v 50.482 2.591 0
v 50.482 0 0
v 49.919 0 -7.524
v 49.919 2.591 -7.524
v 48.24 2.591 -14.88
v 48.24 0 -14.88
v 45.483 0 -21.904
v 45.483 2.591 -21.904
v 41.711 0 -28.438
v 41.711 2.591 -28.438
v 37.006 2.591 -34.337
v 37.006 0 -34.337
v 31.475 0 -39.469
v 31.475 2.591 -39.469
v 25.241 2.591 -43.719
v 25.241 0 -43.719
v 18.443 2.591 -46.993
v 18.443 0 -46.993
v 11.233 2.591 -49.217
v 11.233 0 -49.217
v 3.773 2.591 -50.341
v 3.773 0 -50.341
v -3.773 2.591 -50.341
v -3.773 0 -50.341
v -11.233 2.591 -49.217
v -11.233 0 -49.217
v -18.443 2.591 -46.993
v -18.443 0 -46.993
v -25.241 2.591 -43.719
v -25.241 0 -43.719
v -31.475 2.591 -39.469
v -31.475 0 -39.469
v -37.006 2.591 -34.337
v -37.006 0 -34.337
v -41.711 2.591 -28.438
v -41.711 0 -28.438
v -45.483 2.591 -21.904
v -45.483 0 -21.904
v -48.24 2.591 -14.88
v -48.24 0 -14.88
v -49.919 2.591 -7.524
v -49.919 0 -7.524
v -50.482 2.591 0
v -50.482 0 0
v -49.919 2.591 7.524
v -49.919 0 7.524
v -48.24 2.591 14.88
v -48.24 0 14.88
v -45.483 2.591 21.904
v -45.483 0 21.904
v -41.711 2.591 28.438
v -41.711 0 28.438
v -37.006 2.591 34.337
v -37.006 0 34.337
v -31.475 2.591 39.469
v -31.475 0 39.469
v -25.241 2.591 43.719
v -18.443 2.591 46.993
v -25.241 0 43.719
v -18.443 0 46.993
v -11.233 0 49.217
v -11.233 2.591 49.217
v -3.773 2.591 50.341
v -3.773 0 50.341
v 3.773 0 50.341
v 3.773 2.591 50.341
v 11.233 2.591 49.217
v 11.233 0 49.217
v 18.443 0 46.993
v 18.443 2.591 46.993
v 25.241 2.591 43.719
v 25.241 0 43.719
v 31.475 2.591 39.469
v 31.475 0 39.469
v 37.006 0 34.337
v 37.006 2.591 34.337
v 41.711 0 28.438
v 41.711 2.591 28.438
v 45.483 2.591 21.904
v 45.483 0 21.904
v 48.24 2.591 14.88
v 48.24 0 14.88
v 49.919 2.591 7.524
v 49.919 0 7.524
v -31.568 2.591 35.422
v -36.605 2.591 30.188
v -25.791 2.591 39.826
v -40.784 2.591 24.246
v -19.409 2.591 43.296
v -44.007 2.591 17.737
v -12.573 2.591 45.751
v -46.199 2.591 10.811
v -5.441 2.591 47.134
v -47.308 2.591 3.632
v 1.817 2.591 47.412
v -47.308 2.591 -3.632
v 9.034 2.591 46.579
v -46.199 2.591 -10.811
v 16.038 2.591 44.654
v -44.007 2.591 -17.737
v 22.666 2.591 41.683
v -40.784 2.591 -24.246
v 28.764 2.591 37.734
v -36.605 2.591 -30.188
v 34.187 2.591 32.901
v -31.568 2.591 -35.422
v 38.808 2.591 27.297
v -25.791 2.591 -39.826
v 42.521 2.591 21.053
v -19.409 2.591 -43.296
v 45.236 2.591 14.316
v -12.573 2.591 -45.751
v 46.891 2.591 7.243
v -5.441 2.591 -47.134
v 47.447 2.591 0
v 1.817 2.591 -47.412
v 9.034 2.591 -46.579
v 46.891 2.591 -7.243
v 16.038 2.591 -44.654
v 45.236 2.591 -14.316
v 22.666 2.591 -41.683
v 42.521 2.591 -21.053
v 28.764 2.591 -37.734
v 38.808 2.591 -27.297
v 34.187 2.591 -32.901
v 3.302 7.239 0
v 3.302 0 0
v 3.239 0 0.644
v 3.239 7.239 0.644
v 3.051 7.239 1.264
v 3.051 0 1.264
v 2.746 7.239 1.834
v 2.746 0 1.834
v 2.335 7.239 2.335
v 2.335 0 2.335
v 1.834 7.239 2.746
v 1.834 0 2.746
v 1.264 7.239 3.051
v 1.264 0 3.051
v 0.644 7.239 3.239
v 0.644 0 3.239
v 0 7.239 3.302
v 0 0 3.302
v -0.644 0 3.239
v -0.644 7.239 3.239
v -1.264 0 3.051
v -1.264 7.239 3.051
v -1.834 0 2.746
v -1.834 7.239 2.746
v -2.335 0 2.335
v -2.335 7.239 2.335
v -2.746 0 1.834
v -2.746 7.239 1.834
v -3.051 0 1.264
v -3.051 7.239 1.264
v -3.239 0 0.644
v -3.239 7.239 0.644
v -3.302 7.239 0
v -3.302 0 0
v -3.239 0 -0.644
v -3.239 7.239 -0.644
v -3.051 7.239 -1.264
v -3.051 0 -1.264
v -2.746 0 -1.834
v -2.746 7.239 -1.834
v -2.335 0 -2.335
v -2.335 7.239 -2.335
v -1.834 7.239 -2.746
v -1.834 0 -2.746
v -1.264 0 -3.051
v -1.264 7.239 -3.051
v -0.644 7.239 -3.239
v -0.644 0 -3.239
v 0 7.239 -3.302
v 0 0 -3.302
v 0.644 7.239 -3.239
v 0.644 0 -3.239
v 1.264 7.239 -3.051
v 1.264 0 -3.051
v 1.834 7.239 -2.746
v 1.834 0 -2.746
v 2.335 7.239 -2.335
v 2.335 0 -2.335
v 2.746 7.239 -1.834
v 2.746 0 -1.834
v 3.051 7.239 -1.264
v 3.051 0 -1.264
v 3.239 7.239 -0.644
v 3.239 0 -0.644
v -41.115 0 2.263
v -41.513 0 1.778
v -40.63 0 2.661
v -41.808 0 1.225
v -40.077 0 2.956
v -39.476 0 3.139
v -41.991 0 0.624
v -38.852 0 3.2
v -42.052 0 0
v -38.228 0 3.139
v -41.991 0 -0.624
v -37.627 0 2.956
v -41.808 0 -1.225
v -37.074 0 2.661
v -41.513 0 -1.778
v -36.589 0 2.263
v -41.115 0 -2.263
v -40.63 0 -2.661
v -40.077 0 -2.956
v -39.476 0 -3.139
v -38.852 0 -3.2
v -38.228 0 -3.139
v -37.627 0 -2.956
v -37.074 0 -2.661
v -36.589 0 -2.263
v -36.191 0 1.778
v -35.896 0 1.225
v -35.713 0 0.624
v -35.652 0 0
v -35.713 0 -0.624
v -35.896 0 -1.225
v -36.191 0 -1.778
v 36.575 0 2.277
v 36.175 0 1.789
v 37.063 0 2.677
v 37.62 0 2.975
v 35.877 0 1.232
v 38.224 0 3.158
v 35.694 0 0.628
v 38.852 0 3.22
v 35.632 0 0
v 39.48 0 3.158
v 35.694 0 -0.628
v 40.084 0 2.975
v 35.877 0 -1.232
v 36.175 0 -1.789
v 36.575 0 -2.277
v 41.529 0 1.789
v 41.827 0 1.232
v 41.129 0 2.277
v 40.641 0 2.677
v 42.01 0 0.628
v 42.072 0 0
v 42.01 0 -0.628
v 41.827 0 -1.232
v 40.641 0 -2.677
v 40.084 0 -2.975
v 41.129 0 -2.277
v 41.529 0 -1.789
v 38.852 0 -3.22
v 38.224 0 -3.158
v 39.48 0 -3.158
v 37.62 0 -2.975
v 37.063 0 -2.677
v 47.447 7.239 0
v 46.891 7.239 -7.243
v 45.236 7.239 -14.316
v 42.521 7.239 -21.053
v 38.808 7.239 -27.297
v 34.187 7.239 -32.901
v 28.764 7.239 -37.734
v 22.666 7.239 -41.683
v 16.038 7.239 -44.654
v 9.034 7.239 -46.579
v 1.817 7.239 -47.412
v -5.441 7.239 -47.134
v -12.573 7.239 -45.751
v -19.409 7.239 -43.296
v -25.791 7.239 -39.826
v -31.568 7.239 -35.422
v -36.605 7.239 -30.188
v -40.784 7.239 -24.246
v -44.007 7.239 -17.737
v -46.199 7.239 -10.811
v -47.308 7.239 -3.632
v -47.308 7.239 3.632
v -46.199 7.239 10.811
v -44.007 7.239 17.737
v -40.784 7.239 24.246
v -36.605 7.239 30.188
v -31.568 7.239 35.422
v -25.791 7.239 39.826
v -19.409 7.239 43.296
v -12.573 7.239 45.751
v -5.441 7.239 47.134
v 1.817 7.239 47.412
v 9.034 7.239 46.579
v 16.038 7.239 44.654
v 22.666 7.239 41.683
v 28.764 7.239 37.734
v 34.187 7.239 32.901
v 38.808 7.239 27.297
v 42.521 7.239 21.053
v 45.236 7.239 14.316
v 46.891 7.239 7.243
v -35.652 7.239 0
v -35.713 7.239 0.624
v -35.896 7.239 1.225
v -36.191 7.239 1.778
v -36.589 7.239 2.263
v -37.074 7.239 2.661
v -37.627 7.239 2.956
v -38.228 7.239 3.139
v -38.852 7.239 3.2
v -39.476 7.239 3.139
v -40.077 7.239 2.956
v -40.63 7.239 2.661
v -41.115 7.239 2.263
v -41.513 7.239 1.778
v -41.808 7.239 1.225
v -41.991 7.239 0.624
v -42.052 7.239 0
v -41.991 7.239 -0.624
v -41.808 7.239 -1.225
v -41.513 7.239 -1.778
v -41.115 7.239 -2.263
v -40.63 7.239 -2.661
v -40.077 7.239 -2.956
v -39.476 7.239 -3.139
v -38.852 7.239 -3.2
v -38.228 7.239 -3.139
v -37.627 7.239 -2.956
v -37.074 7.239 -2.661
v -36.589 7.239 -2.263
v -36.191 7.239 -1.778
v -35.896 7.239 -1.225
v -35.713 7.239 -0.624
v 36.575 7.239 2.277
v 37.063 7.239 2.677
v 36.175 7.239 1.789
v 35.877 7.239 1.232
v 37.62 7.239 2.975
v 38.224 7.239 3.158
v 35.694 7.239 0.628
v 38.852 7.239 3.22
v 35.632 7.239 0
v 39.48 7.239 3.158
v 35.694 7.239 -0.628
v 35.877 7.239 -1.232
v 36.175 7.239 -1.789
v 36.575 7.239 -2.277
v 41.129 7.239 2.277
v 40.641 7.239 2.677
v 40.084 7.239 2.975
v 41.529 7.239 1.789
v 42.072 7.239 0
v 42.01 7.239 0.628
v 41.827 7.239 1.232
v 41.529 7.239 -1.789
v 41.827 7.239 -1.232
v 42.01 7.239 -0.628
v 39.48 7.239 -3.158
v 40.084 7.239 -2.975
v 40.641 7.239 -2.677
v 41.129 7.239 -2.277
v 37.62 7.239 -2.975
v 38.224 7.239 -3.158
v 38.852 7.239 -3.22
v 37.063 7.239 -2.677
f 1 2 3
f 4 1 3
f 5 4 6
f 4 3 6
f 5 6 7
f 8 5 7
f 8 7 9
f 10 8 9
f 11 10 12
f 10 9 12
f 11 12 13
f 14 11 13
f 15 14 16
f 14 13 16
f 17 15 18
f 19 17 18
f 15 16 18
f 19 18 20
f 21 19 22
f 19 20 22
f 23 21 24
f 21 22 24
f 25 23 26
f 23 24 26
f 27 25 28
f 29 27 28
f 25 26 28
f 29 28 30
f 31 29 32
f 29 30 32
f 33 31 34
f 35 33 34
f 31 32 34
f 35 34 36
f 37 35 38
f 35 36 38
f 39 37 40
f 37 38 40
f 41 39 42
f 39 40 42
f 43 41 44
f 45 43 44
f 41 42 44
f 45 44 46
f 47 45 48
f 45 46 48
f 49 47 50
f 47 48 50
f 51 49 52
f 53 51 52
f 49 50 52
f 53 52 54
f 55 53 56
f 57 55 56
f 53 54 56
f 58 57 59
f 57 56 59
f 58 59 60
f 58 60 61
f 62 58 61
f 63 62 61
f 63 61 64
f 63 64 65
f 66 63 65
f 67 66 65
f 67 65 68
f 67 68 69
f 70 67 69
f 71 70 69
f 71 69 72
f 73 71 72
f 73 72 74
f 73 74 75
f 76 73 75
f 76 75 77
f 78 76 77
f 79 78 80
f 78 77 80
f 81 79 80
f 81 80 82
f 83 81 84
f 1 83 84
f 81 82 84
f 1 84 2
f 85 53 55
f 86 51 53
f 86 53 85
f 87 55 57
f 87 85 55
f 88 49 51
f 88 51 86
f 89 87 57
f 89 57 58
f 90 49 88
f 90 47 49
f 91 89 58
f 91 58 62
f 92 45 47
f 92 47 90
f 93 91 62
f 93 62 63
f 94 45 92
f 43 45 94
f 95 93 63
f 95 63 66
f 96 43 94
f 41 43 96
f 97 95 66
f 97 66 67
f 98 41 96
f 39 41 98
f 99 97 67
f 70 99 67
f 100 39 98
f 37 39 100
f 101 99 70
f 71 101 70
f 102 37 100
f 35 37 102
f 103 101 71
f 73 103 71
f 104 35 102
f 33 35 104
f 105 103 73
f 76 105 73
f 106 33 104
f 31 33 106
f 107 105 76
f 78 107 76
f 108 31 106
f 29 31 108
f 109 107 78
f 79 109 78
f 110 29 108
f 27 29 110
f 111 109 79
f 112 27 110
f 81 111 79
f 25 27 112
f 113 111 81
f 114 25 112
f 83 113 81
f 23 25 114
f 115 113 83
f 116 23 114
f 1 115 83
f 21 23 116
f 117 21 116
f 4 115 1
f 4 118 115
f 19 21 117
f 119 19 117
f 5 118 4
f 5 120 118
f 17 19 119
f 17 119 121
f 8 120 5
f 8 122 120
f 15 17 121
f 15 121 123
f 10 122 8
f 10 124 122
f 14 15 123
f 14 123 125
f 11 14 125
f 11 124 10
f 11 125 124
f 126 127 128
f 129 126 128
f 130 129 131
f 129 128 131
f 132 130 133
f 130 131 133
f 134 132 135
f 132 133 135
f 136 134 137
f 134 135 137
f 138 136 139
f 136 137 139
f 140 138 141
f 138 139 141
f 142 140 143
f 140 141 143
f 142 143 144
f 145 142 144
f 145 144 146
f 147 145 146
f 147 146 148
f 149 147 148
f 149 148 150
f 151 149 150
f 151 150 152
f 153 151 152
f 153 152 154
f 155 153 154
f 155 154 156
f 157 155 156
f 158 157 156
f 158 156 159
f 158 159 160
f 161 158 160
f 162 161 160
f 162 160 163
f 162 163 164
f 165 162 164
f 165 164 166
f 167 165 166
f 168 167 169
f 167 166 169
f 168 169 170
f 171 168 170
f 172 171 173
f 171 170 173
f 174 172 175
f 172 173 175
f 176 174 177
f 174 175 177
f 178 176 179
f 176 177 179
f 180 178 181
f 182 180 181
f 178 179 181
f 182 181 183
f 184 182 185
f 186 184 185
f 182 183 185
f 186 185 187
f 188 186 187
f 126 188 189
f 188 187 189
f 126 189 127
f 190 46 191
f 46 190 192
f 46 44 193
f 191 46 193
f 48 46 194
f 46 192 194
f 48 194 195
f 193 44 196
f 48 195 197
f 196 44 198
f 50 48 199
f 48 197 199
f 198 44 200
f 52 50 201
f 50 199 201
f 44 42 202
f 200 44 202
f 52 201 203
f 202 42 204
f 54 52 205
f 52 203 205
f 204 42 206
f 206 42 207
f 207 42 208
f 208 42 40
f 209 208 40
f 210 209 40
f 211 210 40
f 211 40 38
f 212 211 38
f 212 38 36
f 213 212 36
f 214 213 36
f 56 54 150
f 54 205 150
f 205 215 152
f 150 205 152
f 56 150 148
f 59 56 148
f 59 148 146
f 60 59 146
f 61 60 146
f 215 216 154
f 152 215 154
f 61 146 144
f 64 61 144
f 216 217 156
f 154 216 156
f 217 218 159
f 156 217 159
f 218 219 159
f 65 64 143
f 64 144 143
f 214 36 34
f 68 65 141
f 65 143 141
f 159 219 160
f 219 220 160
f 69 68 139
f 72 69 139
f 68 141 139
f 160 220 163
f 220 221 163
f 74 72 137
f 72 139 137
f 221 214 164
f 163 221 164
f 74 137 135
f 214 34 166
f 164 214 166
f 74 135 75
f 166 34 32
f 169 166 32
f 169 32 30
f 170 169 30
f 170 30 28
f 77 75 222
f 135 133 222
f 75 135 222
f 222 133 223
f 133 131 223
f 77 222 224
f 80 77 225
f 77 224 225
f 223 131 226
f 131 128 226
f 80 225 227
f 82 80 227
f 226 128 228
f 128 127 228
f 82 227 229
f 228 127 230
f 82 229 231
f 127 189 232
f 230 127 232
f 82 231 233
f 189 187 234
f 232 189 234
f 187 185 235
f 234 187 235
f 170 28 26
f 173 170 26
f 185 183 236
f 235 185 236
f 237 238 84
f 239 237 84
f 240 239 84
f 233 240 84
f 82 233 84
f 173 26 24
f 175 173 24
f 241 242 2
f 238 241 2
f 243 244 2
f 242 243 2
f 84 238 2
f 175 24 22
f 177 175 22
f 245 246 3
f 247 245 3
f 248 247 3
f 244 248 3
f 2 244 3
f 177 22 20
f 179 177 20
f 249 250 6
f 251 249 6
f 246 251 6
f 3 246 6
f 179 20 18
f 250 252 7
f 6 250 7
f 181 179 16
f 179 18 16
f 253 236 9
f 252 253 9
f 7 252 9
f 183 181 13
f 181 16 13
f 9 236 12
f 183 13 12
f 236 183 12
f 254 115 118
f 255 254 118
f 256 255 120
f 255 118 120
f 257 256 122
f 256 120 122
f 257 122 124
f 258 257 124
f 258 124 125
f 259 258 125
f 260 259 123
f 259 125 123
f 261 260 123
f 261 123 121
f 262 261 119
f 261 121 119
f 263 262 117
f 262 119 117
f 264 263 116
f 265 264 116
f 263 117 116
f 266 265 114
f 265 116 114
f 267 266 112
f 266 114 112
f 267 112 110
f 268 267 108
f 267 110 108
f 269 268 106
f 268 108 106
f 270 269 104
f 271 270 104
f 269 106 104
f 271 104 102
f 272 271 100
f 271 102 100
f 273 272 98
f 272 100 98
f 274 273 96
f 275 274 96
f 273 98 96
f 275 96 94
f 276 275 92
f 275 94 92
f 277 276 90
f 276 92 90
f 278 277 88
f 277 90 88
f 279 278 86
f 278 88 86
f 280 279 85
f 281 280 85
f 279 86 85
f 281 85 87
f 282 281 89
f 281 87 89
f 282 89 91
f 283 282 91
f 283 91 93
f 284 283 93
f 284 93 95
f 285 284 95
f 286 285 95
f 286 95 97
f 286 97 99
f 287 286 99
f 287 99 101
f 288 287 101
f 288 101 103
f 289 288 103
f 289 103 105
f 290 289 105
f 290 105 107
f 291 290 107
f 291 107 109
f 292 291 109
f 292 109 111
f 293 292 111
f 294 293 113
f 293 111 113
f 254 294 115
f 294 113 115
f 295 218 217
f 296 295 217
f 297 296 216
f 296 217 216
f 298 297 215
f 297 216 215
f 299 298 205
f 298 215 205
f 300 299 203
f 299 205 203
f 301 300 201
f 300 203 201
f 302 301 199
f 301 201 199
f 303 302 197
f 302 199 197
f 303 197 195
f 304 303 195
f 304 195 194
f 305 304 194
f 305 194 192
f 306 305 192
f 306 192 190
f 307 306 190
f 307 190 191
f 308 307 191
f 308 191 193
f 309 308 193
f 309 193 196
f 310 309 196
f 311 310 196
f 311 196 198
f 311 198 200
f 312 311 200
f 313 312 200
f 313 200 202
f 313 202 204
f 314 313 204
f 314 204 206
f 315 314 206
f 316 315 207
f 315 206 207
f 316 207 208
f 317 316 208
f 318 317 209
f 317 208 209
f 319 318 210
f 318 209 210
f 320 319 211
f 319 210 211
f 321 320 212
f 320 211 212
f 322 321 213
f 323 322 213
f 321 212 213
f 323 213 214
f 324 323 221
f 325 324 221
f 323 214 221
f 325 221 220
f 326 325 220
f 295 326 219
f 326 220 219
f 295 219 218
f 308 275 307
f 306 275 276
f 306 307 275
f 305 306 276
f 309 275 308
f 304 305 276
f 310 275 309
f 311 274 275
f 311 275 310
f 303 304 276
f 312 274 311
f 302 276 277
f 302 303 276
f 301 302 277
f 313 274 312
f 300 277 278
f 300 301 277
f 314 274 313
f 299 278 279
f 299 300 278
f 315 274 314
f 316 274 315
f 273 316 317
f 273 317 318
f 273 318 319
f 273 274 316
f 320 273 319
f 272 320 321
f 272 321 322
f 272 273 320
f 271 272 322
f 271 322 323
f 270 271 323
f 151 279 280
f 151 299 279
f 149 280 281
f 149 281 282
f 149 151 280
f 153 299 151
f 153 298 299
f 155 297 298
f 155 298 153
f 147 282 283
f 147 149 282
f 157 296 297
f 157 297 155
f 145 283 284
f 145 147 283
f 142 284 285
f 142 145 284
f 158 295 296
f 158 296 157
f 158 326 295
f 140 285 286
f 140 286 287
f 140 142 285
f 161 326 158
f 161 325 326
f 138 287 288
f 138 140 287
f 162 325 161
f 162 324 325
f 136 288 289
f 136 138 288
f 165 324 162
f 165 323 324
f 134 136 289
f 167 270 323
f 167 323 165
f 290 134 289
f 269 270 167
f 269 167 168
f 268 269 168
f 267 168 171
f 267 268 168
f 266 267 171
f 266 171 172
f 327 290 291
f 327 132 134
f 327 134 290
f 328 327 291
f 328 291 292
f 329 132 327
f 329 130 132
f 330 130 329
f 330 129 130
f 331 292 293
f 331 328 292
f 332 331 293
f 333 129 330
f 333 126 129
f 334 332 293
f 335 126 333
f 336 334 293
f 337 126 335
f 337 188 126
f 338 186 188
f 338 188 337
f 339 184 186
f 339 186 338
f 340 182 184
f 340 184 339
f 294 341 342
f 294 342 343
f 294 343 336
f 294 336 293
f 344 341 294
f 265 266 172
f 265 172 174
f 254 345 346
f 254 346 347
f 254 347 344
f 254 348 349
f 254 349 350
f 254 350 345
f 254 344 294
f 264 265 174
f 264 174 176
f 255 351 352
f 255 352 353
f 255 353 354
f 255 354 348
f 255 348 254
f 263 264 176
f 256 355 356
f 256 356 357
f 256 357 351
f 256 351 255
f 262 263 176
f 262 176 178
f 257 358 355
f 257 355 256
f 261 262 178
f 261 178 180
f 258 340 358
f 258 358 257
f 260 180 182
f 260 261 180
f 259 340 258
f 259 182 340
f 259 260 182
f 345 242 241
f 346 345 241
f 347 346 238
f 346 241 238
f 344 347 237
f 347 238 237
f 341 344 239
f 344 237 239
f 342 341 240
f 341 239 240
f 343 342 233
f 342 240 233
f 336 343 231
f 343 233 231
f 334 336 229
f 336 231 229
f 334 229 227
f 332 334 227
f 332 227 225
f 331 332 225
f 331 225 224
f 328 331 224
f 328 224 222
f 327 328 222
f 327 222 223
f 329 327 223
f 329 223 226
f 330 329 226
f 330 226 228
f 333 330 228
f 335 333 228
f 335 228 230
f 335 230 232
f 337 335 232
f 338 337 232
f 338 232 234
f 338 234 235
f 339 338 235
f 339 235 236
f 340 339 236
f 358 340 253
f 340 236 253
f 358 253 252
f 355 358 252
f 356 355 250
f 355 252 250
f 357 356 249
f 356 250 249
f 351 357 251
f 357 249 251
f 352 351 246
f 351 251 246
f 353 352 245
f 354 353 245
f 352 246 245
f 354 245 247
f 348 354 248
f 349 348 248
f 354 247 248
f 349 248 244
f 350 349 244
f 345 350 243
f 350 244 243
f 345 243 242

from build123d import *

# Parameters (mm, degrees)
SKETCH1_R           = 50.4825
BOSS_EXTRUDE1_DEPTH = 2.5908
SKETCH2_R           = 47.4472
BOSS_EXTRUDE2_DEPTH = 4.6482
SKETCH3_R           = 3.2
SKETCH3_R_2         = 3.22
SKETCH3_R_3         = 3.302
CUT_EXTRUDE1_DEPTH  = 8.239


with BuildPart() as part:
    # Sketch1 → Boss-Extrude1 (new body)
    with BuildSketch(Plane(origin=(0, 0, 0), x_dir=(1, 0, 0), z_dir=(0, 1, 0))):
        Circle(SKETCH1_R)
    extrude(amount=BOSS_EXTRUDE1_DEPTH)

    # Sketch2 → Boss-Extrude2 (add)
    with BuildSketch(Plane(origin=(0, 2.5908, 0), x_dir=(1, 0, 0), z_dir=(0, 1, 0))):
        Circle(SKETCH2_R)
    extrude(amount=BOSS_EXTRUDE2_DEPTH)

    # Sketch3 → Cut-Extrude1 (cut, through all)
    with BuildSketch(Plane.XZ):
        with Locations((-38.852, 0)):
            Circle(SKETCH3_R)
        with Locations((38.85200002, 0)):
            Circle(SKETCH3_R_2)
        Circle(SKETCH3_R_3)
    extrude(amount=-CUT_EXTRUDE1_DEPTH, mode=Mode.SUBTRACT)


solid = part.part
